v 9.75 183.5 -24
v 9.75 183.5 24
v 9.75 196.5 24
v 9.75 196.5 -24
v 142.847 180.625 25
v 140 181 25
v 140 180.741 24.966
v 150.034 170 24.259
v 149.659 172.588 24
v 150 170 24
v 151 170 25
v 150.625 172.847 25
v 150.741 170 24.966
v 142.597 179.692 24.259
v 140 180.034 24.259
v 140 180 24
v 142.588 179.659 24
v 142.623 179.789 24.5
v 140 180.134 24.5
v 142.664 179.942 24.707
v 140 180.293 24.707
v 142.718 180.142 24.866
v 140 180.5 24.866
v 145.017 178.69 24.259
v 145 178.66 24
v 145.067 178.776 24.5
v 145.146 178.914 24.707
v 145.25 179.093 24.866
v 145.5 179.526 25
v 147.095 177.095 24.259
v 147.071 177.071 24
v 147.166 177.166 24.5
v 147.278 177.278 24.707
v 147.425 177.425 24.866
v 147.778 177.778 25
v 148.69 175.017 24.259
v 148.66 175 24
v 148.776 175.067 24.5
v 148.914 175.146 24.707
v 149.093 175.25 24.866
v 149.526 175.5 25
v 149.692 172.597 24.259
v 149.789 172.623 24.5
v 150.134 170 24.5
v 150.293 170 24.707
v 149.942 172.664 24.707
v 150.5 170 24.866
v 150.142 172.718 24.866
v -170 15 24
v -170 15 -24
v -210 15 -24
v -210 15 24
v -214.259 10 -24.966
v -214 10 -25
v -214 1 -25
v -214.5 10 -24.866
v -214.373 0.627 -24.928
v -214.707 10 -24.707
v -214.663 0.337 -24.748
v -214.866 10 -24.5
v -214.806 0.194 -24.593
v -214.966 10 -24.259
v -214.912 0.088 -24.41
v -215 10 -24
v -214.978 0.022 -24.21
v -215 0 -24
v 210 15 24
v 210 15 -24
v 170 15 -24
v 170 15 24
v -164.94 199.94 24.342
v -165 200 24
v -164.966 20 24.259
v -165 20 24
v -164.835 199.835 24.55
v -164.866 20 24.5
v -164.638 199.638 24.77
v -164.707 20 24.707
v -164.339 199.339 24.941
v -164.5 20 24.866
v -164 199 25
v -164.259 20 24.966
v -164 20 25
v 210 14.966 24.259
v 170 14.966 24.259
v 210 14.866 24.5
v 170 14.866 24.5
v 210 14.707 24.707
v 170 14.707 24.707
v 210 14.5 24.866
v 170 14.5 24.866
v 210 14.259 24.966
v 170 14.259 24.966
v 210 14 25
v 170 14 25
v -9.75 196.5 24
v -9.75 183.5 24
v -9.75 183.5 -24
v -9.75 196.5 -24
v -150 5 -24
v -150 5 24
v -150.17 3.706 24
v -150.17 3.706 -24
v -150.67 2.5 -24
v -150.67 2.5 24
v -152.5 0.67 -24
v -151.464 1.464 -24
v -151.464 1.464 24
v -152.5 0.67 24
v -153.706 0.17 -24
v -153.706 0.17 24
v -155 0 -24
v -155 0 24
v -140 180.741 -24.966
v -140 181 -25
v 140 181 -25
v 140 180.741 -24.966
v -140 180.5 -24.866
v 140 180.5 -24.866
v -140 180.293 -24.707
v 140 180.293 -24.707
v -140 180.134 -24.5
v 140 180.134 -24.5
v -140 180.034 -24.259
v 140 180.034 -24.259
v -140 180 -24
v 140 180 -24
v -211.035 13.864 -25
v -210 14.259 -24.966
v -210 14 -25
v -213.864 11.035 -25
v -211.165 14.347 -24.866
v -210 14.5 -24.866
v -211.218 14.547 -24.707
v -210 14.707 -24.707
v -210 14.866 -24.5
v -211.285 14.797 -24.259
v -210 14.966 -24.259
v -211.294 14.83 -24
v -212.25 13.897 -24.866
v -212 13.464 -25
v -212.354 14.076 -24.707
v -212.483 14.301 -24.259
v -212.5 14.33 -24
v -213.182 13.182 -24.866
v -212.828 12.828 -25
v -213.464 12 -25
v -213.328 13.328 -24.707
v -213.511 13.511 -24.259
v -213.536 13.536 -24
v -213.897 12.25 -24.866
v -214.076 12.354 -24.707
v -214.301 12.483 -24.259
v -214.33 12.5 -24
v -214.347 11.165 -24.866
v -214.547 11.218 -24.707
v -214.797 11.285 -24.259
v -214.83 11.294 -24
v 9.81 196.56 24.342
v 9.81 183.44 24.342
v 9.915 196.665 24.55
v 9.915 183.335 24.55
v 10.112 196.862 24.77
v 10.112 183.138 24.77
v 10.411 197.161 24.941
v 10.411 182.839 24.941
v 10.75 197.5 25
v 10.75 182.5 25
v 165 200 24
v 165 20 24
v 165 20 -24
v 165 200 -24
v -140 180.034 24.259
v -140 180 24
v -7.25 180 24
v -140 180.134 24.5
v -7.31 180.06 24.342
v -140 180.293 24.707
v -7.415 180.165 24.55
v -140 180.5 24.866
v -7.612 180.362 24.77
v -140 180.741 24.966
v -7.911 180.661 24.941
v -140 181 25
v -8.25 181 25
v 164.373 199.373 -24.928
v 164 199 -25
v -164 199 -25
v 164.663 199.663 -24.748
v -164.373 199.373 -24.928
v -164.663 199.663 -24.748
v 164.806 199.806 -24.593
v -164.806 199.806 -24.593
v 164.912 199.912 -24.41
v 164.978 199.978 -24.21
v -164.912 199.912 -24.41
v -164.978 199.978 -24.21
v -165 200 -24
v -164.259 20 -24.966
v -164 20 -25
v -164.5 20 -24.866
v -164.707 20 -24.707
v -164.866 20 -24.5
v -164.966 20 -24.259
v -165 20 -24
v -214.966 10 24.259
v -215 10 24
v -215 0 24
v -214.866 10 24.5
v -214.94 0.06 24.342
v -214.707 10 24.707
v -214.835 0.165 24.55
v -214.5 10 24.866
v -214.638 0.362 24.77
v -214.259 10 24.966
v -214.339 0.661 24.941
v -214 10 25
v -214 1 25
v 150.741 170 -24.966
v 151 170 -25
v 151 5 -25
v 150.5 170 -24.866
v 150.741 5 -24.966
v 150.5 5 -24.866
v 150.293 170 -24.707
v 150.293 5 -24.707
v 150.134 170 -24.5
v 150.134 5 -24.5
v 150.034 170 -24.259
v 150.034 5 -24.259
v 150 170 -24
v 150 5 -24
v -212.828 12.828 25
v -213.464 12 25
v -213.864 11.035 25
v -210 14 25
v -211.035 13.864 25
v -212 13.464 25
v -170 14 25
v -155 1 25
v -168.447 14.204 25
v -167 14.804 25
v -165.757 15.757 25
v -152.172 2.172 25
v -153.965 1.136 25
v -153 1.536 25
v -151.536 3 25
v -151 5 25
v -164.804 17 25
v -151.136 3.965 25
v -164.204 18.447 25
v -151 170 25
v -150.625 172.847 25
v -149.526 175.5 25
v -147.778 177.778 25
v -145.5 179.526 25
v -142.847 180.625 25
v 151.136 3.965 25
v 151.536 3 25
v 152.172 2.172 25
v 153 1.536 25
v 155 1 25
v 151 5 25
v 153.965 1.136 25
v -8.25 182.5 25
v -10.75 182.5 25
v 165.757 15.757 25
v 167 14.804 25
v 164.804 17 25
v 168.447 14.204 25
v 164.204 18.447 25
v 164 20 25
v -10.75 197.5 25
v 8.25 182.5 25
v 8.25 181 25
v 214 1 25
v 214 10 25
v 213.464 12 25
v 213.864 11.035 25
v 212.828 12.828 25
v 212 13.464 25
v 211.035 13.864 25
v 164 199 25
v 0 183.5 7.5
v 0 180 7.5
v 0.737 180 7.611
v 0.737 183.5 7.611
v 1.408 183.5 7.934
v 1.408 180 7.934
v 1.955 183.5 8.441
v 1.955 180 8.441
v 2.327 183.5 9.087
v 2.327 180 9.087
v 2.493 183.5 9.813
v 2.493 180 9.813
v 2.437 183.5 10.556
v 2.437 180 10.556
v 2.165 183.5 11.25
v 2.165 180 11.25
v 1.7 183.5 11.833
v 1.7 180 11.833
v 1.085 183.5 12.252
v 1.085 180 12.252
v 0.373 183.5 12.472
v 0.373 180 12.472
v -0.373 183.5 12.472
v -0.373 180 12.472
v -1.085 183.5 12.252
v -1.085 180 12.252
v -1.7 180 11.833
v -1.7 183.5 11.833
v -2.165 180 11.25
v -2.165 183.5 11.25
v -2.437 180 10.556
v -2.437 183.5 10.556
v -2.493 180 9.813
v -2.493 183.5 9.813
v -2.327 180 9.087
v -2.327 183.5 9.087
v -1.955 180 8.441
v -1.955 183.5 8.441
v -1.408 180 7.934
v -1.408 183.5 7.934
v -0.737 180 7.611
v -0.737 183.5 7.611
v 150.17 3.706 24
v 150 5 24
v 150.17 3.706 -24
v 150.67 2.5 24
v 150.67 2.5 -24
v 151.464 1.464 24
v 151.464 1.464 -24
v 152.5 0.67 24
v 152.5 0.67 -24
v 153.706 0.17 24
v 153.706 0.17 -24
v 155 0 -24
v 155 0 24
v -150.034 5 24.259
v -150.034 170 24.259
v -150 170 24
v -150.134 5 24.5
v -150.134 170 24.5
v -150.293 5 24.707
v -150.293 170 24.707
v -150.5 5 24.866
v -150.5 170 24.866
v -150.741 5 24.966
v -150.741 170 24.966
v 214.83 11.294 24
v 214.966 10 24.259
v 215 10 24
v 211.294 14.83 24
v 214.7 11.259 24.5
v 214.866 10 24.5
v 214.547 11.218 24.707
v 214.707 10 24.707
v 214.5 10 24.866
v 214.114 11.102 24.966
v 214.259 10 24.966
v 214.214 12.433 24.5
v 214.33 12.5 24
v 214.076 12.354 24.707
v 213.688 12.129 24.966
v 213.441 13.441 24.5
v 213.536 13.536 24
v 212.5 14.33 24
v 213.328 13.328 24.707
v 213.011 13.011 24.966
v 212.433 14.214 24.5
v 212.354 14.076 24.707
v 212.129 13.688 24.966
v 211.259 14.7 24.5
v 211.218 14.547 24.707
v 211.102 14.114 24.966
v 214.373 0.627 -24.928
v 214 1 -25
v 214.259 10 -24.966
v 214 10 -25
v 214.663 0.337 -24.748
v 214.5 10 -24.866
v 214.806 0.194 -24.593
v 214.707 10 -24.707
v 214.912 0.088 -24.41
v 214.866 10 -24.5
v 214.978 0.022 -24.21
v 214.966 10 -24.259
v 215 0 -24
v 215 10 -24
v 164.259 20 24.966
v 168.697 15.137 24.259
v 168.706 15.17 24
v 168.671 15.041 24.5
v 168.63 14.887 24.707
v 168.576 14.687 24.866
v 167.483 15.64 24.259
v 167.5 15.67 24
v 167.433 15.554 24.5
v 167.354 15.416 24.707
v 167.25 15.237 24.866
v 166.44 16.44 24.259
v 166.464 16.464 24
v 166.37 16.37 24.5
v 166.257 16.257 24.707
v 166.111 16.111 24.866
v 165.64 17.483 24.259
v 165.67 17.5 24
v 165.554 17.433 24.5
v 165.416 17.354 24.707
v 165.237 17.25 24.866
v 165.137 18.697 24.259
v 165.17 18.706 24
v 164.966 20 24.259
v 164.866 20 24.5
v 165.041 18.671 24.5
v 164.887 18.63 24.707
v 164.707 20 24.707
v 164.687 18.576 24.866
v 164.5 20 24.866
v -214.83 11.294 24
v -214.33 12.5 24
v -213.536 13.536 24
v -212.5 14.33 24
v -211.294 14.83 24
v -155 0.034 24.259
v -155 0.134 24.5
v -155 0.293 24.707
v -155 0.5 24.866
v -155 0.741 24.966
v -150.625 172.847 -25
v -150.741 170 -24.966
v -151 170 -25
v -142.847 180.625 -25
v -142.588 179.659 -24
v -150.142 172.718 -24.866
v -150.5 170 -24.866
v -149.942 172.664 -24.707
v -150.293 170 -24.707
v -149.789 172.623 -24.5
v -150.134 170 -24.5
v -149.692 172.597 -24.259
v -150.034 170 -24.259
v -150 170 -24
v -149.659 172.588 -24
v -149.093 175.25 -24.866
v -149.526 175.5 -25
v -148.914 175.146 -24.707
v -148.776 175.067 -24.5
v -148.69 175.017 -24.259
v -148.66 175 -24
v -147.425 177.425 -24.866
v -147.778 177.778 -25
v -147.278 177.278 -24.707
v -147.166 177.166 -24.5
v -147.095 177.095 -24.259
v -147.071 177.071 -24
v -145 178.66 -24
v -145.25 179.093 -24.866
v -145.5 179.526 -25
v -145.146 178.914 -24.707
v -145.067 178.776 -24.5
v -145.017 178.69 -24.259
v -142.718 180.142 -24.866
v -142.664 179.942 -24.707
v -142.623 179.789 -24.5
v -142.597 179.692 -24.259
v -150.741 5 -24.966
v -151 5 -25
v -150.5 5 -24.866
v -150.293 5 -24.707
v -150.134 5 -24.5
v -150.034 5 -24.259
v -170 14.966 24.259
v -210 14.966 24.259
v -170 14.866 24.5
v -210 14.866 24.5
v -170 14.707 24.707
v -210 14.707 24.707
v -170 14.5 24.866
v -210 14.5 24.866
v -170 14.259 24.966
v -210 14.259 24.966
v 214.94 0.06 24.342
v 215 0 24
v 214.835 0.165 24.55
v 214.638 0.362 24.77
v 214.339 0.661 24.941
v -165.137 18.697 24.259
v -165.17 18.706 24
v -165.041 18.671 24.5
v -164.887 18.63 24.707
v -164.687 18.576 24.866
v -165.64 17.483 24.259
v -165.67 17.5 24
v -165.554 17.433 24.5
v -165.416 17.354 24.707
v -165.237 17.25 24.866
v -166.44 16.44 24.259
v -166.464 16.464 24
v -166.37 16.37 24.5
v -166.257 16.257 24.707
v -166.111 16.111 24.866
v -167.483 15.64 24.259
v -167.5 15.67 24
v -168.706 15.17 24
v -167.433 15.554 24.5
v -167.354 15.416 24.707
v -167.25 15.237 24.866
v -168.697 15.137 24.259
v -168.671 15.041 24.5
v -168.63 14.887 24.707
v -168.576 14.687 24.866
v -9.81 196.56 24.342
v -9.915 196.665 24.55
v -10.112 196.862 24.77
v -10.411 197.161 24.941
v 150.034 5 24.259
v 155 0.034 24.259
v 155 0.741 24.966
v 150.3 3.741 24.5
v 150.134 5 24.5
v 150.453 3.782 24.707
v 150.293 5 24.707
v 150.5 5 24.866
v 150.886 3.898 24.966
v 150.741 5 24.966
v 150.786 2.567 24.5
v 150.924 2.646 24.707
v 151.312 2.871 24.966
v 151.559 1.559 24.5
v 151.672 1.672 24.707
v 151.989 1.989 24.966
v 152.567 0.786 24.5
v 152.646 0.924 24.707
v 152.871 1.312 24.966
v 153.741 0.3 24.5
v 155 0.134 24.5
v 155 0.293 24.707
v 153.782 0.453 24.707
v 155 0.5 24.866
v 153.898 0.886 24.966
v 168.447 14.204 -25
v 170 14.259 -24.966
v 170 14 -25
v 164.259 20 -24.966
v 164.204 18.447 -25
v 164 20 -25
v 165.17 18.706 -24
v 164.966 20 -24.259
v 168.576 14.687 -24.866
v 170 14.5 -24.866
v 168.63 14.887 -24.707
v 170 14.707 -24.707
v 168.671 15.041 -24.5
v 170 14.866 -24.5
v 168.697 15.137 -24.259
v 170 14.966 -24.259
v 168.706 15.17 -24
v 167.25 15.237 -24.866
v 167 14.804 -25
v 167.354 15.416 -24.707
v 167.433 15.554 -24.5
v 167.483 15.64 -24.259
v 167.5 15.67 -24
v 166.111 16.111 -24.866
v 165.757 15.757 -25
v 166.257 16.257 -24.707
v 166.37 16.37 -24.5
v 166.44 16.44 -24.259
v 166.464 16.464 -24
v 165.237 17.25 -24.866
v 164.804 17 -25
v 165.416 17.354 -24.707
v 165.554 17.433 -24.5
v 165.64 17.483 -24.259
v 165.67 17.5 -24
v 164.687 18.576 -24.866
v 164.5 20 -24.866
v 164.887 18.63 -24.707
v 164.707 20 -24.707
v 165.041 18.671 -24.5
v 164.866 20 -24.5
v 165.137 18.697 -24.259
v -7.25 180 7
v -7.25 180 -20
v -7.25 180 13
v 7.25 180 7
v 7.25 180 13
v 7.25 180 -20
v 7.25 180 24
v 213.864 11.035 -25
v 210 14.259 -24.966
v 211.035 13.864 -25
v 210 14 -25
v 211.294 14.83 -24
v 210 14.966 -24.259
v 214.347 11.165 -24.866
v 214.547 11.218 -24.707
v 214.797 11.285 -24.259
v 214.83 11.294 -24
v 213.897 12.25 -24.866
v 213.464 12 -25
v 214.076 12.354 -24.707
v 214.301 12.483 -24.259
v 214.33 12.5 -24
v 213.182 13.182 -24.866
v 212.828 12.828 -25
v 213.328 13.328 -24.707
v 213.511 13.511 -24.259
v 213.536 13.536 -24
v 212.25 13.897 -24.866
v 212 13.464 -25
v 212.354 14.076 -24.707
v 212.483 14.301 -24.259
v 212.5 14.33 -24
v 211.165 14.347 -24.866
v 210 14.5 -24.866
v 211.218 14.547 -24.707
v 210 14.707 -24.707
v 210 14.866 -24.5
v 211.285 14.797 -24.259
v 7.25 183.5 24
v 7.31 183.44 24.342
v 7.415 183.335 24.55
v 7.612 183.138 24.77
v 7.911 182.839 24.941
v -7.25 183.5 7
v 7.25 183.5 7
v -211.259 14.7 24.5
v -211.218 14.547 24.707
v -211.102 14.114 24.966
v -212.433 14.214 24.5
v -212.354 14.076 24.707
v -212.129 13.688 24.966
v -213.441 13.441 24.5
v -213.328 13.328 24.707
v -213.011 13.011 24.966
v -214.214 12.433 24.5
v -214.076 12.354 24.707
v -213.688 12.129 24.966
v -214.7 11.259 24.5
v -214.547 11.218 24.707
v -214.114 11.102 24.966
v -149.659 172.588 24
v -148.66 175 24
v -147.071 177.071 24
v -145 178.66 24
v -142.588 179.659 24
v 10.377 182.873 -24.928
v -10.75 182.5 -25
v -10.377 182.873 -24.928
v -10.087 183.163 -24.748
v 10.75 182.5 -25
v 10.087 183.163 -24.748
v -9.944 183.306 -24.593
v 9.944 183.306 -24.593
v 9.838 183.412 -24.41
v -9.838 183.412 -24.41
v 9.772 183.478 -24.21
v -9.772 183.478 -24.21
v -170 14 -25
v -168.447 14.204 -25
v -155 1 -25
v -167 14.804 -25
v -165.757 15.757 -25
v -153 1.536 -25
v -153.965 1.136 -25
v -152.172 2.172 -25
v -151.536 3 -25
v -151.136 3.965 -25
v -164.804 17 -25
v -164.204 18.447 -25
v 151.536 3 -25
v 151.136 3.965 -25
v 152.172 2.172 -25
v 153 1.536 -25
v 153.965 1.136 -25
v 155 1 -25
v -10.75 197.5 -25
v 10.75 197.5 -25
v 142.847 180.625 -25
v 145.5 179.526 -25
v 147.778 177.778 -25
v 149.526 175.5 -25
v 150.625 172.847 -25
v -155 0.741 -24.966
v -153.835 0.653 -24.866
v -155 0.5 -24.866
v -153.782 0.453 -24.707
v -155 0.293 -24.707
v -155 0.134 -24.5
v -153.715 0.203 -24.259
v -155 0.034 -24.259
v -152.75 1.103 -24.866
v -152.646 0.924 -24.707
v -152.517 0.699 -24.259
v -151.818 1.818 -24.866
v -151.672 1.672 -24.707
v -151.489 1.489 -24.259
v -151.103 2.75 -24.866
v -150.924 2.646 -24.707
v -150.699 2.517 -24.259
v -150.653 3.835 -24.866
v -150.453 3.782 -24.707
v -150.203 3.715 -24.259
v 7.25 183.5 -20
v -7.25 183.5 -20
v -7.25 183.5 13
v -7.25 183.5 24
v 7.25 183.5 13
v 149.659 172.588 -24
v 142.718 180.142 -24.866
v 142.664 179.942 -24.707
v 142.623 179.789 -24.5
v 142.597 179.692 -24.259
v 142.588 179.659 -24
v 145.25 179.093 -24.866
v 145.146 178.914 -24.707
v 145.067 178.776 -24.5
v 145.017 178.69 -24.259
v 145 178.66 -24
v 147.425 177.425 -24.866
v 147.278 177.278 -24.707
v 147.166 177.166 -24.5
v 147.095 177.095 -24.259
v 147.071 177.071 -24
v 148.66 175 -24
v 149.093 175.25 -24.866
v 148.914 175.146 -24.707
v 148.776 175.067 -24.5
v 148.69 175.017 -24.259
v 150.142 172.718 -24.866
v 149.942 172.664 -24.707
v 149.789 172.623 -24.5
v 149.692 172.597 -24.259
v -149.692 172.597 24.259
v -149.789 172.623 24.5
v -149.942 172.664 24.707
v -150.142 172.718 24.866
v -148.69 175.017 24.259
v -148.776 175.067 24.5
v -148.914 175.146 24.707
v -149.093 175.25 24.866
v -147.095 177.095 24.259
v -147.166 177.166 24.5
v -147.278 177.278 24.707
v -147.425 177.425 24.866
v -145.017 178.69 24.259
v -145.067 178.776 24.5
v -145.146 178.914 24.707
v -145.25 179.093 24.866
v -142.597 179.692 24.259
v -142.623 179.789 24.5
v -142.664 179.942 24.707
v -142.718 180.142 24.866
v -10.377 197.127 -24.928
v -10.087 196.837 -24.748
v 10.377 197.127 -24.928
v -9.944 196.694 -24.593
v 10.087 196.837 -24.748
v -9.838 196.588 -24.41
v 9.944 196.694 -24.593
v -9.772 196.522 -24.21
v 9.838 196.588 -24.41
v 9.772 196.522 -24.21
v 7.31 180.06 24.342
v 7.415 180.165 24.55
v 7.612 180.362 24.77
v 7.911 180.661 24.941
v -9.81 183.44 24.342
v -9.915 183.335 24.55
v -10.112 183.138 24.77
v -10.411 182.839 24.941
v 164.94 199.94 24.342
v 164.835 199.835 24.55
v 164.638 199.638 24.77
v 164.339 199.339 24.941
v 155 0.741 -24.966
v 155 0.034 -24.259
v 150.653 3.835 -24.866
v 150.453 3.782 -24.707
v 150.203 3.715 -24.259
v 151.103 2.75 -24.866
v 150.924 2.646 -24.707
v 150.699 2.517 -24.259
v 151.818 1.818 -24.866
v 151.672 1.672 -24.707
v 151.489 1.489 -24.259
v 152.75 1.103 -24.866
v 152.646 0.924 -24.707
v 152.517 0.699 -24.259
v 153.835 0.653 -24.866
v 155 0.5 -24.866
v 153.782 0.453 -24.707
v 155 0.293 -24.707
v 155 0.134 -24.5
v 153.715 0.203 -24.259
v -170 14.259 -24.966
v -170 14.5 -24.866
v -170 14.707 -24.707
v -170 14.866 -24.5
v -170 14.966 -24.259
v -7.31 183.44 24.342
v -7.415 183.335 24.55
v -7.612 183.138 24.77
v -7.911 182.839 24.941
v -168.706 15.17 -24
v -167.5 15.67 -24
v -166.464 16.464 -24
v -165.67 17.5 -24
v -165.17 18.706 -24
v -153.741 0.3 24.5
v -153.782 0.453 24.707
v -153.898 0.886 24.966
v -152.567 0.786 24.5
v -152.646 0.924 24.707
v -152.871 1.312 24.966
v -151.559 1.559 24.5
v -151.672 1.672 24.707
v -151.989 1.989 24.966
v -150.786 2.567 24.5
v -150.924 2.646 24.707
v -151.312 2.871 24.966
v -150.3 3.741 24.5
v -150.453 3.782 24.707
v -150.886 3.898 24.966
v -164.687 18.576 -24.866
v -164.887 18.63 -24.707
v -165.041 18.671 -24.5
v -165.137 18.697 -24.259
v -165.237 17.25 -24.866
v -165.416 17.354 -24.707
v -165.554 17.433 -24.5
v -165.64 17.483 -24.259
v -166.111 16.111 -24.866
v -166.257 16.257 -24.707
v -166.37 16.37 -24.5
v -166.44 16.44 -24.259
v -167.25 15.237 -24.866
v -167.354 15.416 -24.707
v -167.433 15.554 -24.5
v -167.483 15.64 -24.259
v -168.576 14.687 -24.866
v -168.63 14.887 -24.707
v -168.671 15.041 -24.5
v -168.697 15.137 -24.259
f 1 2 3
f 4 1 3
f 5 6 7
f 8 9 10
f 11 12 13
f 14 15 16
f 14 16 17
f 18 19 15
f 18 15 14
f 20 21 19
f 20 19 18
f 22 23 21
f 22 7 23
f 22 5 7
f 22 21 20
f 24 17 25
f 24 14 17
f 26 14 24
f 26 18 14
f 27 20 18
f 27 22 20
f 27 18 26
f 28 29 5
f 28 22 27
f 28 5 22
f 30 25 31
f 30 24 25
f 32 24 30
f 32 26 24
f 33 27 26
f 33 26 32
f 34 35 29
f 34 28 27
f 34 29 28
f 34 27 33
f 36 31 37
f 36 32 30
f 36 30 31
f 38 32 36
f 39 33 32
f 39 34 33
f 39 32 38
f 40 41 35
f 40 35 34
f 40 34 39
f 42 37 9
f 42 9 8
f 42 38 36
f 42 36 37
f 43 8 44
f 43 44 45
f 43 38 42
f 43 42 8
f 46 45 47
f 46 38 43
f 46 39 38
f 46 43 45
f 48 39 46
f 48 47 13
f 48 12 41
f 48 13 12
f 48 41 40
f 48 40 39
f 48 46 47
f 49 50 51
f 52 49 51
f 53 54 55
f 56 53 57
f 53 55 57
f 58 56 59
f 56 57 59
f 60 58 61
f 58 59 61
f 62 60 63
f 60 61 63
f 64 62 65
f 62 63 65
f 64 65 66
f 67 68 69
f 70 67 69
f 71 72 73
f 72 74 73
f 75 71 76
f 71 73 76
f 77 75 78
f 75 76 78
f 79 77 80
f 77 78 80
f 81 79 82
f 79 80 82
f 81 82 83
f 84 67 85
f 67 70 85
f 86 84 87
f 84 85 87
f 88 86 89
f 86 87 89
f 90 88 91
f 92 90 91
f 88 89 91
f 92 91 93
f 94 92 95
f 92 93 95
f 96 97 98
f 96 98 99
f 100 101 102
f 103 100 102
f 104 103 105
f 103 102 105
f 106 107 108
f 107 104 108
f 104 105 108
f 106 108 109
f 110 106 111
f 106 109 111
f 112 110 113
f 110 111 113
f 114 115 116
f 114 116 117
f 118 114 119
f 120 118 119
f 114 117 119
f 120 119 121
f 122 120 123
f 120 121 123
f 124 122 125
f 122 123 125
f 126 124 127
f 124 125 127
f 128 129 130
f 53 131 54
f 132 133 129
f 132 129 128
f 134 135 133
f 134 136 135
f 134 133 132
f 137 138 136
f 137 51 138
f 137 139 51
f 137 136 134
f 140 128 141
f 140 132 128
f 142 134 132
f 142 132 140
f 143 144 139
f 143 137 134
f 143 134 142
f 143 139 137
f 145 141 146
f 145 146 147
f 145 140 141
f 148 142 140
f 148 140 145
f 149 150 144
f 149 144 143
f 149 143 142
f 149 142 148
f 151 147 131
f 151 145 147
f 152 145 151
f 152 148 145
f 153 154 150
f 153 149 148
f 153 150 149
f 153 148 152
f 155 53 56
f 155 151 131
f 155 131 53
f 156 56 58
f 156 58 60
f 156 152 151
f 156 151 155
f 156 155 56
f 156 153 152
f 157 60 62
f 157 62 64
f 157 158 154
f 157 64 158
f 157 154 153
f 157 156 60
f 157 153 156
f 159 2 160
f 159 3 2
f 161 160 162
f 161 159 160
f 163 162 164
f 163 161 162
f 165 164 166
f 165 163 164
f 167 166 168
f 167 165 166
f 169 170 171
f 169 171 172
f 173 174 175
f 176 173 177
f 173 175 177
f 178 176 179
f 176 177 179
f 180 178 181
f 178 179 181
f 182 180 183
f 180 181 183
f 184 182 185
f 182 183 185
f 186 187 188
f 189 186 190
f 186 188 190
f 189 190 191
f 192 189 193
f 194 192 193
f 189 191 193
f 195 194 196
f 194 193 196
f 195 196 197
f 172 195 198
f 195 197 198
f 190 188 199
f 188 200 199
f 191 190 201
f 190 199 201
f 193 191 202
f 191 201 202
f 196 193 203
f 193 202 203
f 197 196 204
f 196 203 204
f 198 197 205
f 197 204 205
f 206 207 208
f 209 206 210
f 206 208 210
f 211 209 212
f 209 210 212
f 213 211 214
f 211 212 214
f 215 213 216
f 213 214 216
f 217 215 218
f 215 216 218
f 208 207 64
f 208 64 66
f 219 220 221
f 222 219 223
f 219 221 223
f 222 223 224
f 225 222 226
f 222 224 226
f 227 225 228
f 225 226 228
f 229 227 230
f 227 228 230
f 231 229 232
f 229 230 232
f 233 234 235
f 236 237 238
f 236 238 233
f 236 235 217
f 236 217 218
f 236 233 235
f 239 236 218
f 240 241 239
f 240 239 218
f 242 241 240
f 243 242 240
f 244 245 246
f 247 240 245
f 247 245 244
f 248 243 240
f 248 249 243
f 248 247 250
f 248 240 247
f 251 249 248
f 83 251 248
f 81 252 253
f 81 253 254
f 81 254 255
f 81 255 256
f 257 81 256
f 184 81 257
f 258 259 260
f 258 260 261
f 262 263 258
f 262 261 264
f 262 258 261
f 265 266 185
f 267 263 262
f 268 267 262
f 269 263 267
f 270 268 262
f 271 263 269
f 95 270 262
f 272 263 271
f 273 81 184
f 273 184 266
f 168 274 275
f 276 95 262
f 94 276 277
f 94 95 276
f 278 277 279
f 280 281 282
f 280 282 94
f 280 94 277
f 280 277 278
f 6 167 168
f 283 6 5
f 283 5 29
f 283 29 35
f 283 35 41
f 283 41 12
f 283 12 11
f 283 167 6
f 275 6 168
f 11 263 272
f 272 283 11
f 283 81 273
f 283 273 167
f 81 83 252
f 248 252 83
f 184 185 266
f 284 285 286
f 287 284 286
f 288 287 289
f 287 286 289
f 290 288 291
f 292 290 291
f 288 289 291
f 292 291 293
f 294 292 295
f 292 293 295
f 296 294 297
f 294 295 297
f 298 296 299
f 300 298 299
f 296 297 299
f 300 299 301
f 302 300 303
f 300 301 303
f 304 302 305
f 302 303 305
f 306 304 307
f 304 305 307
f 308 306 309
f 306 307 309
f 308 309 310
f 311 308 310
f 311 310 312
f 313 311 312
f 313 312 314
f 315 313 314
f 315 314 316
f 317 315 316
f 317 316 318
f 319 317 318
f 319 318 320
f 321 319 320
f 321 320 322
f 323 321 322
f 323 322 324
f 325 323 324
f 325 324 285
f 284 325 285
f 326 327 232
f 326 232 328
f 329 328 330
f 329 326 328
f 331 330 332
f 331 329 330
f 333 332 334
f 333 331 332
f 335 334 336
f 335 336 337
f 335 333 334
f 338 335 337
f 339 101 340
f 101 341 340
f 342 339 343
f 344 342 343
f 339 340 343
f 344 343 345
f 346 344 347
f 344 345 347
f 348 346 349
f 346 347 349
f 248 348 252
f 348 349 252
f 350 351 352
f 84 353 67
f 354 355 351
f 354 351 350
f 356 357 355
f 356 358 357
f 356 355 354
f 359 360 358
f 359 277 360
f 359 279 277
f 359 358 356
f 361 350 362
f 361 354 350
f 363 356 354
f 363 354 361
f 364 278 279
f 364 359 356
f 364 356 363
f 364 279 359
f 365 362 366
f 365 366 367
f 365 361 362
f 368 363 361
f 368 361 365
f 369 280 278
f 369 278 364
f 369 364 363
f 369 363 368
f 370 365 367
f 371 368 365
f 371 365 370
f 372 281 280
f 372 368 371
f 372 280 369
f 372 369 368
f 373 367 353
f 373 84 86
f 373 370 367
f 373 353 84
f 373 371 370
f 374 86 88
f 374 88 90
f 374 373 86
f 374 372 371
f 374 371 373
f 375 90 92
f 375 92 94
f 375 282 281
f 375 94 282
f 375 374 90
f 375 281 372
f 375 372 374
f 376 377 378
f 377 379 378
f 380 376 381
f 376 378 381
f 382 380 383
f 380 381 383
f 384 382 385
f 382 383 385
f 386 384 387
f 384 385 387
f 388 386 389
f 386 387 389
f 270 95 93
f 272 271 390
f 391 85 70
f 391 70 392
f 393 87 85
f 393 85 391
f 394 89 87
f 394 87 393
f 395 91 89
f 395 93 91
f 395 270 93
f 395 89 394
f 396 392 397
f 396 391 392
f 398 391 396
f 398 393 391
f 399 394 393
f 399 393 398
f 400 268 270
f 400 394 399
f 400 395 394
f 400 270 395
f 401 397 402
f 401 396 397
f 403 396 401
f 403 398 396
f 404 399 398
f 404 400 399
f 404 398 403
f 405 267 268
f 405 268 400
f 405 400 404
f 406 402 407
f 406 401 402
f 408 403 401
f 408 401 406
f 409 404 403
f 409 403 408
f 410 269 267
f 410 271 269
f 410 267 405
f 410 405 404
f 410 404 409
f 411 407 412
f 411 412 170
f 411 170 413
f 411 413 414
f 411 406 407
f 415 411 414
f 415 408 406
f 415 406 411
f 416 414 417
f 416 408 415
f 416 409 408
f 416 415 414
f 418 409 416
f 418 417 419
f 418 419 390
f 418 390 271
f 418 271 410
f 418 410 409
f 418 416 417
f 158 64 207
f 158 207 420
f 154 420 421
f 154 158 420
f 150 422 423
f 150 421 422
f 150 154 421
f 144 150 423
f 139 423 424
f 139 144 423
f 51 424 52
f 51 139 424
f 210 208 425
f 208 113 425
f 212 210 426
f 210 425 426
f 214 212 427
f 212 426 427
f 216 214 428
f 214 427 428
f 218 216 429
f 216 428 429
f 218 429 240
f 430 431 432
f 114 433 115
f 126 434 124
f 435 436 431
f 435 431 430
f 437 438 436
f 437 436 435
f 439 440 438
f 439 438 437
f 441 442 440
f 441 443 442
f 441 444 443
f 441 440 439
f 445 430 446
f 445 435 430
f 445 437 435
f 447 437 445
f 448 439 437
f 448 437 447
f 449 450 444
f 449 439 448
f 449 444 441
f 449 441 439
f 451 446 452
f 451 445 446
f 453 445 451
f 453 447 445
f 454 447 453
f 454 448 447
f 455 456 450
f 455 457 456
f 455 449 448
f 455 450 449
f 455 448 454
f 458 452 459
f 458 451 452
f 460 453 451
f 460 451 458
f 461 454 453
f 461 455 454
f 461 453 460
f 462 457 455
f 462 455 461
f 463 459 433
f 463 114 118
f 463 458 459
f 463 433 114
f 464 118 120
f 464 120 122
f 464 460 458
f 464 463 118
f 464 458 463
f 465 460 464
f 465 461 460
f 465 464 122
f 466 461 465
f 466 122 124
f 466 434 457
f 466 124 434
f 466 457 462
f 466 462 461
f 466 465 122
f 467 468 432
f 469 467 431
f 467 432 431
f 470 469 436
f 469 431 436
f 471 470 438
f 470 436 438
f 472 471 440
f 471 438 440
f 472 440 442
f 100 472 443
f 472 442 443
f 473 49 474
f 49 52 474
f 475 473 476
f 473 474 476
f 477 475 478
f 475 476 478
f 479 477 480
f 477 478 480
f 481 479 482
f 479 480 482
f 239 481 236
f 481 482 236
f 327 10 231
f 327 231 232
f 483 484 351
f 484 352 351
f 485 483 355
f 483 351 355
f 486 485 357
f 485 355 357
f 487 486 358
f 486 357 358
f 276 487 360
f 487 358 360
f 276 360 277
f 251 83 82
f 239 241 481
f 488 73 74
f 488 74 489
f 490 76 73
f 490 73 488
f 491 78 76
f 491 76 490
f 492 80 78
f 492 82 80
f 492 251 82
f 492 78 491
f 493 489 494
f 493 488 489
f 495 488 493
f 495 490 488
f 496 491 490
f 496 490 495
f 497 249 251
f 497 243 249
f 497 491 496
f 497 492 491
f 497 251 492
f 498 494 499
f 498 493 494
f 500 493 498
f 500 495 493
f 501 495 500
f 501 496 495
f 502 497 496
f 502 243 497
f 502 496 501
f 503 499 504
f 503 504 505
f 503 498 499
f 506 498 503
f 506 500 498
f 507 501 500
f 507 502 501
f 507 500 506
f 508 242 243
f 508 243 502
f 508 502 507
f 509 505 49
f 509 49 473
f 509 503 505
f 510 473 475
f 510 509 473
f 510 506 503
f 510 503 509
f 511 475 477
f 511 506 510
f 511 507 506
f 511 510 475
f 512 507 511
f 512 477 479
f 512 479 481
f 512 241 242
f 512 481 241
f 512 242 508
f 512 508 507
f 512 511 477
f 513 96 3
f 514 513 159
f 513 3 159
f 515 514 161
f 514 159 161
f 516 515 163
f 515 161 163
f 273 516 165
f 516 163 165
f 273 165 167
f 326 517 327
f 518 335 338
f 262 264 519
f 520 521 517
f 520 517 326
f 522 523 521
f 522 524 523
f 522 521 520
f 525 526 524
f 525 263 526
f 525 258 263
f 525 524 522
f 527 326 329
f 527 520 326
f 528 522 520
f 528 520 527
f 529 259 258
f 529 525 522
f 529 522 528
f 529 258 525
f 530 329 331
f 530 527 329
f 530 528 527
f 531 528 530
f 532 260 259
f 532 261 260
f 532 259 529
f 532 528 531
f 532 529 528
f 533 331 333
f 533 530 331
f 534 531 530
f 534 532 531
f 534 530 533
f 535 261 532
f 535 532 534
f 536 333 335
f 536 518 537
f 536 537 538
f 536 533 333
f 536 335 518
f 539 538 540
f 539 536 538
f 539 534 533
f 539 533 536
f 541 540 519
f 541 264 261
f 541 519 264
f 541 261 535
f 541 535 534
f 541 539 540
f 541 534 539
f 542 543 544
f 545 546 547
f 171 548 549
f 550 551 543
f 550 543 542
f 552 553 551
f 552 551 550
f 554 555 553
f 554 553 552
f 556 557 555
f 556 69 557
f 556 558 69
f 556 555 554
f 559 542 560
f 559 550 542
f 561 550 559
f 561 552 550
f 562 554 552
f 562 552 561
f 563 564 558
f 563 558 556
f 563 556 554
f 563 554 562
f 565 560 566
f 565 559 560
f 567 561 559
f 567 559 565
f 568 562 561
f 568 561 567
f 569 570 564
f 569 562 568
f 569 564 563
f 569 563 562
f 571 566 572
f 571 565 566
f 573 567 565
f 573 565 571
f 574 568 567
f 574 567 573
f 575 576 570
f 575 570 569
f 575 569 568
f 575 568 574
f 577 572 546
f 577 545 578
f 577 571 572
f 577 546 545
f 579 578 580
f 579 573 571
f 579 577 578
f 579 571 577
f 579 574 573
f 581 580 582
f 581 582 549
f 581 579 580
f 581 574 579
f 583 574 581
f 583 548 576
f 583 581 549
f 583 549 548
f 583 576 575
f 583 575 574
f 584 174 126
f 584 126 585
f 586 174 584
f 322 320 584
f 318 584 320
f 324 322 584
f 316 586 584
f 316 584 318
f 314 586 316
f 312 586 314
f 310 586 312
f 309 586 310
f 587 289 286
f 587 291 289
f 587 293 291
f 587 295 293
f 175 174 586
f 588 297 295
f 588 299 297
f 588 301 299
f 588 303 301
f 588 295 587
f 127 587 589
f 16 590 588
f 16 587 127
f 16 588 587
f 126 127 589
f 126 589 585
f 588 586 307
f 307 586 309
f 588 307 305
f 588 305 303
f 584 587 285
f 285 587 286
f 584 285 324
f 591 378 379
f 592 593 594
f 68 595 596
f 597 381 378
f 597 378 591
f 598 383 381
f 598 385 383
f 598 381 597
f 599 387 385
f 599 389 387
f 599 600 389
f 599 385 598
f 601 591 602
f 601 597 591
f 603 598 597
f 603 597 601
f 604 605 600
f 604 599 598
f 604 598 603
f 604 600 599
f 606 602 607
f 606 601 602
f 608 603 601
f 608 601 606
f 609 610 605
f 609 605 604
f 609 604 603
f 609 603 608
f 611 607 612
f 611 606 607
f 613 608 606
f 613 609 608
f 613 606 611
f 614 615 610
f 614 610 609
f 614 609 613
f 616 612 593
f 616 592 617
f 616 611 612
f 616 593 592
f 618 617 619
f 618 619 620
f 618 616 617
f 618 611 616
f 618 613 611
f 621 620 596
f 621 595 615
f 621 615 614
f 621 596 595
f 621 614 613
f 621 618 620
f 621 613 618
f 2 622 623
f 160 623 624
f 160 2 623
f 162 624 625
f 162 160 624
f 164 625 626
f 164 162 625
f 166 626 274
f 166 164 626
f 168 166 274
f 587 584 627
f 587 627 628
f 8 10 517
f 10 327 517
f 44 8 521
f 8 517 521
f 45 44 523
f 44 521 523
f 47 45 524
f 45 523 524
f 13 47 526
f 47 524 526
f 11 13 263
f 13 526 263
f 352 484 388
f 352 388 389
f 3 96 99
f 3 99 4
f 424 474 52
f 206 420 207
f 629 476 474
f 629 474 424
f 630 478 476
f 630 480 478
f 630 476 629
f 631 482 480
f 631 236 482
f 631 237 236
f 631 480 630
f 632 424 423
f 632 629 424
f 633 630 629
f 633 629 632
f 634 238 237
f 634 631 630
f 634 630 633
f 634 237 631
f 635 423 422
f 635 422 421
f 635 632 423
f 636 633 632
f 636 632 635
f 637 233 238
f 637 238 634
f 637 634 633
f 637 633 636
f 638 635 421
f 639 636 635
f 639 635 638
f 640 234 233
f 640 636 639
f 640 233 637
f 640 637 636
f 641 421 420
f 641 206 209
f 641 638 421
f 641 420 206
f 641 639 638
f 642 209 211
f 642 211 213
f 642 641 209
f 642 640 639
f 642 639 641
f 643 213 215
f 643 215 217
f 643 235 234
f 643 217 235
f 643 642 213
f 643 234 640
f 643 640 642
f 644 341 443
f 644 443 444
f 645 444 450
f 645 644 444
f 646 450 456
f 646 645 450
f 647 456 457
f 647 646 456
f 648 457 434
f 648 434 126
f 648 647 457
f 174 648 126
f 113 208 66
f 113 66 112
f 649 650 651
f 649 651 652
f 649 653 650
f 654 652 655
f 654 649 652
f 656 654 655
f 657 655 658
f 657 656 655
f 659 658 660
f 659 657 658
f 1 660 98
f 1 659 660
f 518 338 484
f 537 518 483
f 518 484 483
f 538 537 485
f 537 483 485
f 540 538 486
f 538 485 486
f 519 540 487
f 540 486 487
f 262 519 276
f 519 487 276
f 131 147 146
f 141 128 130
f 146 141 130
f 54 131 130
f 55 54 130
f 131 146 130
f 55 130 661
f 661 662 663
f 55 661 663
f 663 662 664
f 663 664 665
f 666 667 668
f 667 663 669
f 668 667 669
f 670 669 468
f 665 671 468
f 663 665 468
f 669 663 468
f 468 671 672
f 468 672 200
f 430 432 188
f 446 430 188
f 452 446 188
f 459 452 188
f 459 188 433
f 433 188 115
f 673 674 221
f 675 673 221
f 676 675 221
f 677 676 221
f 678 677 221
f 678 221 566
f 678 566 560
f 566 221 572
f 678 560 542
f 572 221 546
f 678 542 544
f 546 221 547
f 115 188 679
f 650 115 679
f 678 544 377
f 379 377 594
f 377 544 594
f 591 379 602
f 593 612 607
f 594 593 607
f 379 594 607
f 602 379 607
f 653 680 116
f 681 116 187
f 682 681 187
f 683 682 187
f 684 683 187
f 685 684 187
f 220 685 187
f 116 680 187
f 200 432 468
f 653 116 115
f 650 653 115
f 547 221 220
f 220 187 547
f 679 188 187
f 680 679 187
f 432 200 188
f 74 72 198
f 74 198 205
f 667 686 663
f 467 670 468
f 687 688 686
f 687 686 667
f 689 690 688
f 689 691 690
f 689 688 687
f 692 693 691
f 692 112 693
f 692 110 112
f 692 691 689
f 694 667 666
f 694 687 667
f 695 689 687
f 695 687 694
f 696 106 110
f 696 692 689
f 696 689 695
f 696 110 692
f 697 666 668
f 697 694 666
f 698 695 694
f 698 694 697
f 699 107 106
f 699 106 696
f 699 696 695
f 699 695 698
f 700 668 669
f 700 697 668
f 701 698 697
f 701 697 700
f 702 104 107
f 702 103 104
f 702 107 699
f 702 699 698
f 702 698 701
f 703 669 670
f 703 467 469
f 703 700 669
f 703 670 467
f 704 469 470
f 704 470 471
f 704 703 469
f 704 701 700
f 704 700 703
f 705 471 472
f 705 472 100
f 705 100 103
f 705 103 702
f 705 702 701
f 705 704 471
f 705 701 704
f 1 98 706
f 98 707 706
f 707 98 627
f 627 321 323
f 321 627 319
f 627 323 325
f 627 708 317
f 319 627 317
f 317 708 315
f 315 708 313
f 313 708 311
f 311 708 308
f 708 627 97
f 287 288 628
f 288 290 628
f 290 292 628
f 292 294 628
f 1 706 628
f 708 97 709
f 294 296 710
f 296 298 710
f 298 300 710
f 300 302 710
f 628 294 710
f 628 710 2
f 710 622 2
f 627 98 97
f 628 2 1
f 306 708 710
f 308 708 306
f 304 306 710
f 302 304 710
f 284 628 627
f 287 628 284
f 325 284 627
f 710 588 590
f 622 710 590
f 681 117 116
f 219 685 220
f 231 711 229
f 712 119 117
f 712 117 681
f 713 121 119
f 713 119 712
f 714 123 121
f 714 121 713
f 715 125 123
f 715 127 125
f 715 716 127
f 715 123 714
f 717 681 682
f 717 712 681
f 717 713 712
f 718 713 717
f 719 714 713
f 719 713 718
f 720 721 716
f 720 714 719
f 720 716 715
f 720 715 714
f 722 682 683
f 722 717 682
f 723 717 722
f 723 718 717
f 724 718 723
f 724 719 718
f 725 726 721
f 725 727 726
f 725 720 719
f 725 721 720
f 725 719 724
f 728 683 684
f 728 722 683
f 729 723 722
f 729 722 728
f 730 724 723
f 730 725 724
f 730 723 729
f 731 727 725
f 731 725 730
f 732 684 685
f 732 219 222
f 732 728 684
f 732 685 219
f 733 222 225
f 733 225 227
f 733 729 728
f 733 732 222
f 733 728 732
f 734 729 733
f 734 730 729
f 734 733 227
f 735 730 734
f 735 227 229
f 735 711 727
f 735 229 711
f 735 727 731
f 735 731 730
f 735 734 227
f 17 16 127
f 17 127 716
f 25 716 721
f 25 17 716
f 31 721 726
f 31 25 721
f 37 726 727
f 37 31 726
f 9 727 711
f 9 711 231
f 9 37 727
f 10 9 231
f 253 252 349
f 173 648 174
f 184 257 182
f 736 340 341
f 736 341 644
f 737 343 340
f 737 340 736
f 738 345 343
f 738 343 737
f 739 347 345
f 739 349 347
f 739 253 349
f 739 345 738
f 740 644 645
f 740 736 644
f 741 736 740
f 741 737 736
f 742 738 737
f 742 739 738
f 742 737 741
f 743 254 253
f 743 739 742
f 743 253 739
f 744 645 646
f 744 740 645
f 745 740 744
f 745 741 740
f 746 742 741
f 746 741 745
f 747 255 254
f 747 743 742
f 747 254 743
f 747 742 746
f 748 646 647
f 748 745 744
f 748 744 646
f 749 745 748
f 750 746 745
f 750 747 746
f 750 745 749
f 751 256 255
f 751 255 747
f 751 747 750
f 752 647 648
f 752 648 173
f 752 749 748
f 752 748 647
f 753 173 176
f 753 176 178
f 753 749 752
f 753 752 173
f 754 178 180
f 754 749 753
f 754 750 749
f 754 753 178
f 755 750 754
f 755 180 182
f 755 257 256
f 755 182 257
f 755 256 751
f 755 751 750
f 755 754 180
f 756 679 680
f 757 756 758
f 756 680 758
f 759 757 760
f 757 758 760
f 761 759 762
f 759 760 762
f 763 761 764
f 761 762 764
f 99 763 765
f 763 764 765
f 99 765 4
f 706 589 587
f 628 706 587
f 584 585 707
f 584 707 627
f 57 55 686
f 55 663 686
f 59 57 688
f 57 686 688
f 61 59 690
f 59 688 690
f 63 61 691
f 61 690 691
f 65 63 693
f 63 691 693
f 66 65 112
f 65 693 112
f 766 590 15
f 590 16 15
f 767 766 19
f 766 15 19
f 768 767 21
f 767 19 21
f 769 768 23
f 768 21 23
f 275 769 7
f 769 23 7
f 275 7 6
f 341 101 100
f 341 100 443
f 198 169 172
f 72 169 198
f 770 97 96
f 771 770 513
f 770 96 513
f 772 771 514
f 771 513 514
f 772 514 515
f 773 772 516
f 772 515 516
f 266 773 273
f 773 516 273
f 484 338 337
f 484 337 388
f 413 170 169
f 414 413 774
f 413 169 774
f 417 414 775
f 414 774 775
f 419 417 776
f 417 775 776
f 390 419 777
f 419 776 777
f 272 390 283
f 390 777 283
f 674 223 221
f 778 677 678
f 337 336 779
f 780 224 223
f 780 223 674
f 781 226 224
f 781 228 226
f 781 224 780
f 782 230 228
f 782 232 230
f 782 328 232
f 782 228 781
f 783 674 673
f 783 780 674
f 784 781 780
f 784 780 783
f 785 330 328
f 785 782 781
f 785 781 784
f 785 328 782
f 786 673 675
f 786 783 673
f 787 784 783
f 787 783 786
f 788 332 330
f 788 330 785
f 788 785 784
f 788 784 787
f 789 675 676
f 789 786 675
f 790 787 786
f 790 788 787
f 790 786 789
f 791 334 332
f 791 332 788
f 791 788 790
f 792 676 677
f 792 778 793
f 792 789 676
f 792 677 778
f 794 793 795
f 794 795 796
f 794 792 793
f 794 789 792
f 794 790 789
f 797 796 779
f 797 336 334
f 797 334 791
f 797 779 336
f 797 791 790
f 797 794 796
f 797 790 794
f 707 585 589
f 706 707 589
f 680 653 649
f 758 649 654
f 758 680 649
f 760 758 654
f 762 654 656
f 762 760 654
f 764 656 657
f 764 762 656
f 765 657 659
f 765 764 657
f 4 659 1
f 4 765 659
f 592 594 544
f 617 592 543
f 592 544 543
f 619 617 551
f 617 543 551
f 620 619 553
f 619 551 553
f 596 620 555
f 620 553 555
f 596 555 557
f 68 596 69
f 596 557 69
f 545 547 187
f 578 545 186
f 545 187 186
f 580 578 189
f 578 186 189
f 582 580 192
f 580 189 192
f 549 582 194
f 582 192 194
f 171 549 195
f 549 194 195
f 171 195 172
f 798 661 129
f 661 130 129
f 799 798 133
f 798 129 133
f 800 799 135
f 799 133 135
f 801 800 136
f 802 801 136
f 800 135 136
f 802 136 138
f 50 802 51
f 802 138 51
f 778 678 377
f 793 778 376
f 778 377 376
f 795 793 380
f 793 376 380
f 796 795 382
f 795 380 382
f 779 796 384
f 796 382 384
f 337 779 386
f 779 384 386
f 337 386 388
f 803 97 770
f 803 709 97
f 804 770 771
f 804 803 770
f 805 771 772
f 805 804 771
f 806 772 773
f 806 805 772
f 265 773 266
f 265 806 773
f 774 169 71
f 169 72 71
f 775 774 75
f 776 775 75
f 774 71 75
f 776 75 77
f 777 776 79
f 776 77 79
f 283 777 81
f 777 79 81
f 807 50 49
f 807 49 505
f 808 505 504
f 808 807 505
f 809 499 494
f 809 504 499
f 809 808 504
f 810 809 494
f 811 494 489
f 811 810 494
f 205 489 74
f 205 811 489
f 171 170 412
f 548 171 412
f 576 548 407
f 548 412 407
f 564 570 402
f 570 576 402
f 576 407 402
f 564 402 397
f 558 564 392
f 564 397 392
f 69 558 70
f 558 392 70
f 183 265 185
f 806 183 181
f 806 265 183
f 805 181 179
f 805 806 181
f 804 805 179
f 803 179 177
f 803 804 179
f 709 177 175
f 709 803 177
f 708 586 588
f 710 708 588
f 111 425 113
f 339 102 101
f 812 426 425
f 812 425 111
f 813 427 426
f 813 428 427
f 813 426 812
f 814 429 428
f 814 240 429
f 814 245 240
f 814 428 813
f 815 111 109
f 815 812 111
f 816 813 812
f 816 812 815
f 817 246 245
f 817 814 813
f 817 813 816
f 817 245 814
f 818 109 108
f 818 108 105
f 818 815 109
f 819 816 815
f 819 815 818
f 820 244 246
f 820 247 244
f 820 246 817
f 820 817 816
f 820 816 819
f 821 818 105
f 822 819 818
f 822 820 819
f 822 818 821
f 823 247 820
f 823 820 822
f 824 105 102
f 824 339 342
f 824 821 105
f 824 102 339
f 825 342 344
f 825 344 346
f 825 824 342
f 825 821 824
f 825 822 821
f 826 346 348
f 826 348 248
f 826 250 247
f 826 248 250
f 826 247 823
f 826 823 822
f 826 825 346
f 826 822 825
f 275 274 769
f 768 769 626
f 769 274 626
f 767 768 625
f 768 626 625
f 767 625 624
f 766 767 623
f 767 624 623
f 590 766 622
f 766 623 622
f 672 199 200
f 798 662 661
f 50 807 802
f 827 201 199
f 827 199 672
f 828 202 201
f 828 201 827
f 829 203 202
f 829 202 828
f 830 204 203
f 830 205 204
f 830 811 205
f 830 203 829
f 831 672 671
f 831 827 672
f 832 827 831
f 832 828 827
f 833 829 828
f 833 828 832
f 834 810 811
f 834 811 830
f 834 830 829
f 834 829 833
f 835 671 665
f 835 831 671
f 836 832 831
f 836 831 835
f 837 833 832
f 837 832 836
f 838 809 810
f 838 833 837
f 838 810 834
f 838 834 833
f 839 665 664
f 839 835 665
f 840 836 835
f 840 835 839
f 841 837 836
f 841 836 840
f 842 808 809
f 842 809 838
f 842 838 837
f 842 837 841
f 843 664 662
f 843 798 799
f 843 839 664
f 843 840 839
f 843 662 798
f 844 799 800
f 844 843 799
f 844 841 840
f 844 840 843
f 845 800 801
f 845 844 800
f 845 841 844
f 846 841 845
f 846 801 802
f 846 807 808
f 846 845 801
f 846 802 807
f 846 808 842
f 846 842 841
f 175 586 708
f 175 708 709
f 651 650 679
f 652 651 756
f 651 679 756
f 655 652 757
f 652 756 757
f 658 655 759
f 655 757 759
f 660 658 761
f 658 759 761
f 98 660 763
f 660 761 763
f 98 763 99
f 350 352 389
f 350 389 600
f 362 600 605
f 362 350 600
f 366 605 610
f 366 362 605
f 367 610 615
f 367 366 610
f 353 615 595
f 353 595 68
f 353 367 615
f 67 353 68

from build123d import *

# Parameters (mm, degrees)
BOSS_EXTRUDE1_DEPTH = 25
SKETCH2_W           = 19.5
SKETCH2_H           = 13
CUT_EXTRUDE1_DEPTH  = 298.867420172
SKETCH3_R           = 2.5
SKETCH3_W           = 14.5
SKETCH3_H           = 12
SKETCH3_H_2         = 27
CUT_EXTRUDE2_DEPTH  = 5
FILLET2_R           = 10
FILLET3_R           = 5
FILLET4_R           = 1


with BuildPart() as part:
    # Sketch1 → Boss-Extrude1 (new, symmetric)
    with BuildSketch(Plane.XY):
        Polygon((-215, 0), (-150, 0), (-150, 180), (150, 180), (150, 0), (215, 0), (215, 15), (165, 15), (165, 195), (165, 200), (150, 200), (-150, 200), (-165, 200), (-165, 195), (-165, 15), (-215, 15), align=None)
    extrude(amount=BOSS_EXTRUDE1_DEPTH, both=True)

    # Sketch2 → Cut-Extrude1 (cut, through all)
    with BuildSketch(Plane.XY.offset(25)):
        with Locations((0, 190)):
            Rectangle(SKETCH2_W, SKETCH2_H)
    extrude(amount=-CUT_EXTRUDE1_DEPTH, mode=Mode.SUBTRACT)

    # Sketch3 → Cut-Extrude2 (cut)
    with BuildSketch(Plane.XZ.offset(-180)):
        with Locations(Location((0, 10, 0), (0, 0, 270))):
            Circle(SKETCH3_R)
        with Locations((0, 19)):
            Rectangle(SKETCH3_W, SKETCH3_H)
        with Locations((0, -6.5)):
            Rectangle(SKETCH3_W, SKETCH3_H_2)
    extrude(amount=-CUT_EXTRUDE2_DEPTH, mode=Mode.SUBTRACT)

    # Fillet2
    fillet2_edges = [part.edges().sort_by_distance(p)[0] for p in [
        (150, 180, 0),
        (-150, 180, 0),
    ]]
    fillet(fillet2_edges, radius=FILLET2_R)

    # Fillet3
    fillet3_edges = [part.edges().sort_by_distance(p)[0] for p in [
        (-215, 15, 0),
        (-165, 15, 0),
        (165, 15, 0),
        (215, 15, 0),
        (150, 0, 0),
        (-150, 0, 0),
    ]]
    fillet(fillet3_edges, radius=FILLET3_R)

    # Fillet4
    fillet4_edges = [part.edges().sort_by_distance(p)[0] for p in [
        (150, 87.5, -25),
        (150, 87.5, 25),
        (-73.625, 180, 25),
        (0, 180, -25),
        (147.071067812, 177.071067812, -25),
        (147.071067812, 177.071067812, 25),
        (-147.071067812, 177.071067812, -25),
        (-147.071067812, 177.071067812, 25),
        (185, 0, -25),
        (185, 0, 25),
        (-215, 5, -25),
        (-190, 15, -25),
        (165, 110, -25),
        (190, 15, -25),
        (-150, 87.5, -25),
        (-213.535533906, 13.535533906, -25),
        (213.535533906, 13.535533906, -25),
        (-151.464466094, 1.464466094, -25),
        (151.464466094, 1.464466094, -25),
        (190, 15, 25),
        (165, 110, 25),
        (-190, 15, 25),
        (-215, 5, 25),
        (-150, 87.5, 25),
        (-213.535533906, 13.535533906, 25),
        (213.535533906, 13.535533906, 25),
        (-151.464466094, 1.464466094, 25),
        (151.464466094, 1.464466094, 25),
        (166.464466094, 16.464466094, -25),
        (166.464466094, 16.464466094, 25),
        (-166.464466094, 16.464466094, -25),
        (-166.464466094, 16.464466094, 25),
        (-165, 110, -25),
        (0, 200, -25),
        (215, 5, -25),
        (-185, 0, -25),
        (215, 5, 25),
        (0, 200, 25),
        (9.75, 190, -25),
        (0, 183.5, -25),
        (-9.75, 190, -25),
        (0, 196.5, -25),
        (9.75, 190, 25),
        (0, 196.5, 25),
        (-9.75, 190, 25),
        (-8.5, 183.5, 25),
        (-165, 110, 25),
        (8.5, 183.5, 25),
        (73.625, 180, 25),
        (-7.25, 181.75, 25),
        (7.25, 181.75, 25),
        (-185, 0, 25),
    ]]
    fillet(fillet4_edges, radius=FILLET4_R)


solid = part.part
